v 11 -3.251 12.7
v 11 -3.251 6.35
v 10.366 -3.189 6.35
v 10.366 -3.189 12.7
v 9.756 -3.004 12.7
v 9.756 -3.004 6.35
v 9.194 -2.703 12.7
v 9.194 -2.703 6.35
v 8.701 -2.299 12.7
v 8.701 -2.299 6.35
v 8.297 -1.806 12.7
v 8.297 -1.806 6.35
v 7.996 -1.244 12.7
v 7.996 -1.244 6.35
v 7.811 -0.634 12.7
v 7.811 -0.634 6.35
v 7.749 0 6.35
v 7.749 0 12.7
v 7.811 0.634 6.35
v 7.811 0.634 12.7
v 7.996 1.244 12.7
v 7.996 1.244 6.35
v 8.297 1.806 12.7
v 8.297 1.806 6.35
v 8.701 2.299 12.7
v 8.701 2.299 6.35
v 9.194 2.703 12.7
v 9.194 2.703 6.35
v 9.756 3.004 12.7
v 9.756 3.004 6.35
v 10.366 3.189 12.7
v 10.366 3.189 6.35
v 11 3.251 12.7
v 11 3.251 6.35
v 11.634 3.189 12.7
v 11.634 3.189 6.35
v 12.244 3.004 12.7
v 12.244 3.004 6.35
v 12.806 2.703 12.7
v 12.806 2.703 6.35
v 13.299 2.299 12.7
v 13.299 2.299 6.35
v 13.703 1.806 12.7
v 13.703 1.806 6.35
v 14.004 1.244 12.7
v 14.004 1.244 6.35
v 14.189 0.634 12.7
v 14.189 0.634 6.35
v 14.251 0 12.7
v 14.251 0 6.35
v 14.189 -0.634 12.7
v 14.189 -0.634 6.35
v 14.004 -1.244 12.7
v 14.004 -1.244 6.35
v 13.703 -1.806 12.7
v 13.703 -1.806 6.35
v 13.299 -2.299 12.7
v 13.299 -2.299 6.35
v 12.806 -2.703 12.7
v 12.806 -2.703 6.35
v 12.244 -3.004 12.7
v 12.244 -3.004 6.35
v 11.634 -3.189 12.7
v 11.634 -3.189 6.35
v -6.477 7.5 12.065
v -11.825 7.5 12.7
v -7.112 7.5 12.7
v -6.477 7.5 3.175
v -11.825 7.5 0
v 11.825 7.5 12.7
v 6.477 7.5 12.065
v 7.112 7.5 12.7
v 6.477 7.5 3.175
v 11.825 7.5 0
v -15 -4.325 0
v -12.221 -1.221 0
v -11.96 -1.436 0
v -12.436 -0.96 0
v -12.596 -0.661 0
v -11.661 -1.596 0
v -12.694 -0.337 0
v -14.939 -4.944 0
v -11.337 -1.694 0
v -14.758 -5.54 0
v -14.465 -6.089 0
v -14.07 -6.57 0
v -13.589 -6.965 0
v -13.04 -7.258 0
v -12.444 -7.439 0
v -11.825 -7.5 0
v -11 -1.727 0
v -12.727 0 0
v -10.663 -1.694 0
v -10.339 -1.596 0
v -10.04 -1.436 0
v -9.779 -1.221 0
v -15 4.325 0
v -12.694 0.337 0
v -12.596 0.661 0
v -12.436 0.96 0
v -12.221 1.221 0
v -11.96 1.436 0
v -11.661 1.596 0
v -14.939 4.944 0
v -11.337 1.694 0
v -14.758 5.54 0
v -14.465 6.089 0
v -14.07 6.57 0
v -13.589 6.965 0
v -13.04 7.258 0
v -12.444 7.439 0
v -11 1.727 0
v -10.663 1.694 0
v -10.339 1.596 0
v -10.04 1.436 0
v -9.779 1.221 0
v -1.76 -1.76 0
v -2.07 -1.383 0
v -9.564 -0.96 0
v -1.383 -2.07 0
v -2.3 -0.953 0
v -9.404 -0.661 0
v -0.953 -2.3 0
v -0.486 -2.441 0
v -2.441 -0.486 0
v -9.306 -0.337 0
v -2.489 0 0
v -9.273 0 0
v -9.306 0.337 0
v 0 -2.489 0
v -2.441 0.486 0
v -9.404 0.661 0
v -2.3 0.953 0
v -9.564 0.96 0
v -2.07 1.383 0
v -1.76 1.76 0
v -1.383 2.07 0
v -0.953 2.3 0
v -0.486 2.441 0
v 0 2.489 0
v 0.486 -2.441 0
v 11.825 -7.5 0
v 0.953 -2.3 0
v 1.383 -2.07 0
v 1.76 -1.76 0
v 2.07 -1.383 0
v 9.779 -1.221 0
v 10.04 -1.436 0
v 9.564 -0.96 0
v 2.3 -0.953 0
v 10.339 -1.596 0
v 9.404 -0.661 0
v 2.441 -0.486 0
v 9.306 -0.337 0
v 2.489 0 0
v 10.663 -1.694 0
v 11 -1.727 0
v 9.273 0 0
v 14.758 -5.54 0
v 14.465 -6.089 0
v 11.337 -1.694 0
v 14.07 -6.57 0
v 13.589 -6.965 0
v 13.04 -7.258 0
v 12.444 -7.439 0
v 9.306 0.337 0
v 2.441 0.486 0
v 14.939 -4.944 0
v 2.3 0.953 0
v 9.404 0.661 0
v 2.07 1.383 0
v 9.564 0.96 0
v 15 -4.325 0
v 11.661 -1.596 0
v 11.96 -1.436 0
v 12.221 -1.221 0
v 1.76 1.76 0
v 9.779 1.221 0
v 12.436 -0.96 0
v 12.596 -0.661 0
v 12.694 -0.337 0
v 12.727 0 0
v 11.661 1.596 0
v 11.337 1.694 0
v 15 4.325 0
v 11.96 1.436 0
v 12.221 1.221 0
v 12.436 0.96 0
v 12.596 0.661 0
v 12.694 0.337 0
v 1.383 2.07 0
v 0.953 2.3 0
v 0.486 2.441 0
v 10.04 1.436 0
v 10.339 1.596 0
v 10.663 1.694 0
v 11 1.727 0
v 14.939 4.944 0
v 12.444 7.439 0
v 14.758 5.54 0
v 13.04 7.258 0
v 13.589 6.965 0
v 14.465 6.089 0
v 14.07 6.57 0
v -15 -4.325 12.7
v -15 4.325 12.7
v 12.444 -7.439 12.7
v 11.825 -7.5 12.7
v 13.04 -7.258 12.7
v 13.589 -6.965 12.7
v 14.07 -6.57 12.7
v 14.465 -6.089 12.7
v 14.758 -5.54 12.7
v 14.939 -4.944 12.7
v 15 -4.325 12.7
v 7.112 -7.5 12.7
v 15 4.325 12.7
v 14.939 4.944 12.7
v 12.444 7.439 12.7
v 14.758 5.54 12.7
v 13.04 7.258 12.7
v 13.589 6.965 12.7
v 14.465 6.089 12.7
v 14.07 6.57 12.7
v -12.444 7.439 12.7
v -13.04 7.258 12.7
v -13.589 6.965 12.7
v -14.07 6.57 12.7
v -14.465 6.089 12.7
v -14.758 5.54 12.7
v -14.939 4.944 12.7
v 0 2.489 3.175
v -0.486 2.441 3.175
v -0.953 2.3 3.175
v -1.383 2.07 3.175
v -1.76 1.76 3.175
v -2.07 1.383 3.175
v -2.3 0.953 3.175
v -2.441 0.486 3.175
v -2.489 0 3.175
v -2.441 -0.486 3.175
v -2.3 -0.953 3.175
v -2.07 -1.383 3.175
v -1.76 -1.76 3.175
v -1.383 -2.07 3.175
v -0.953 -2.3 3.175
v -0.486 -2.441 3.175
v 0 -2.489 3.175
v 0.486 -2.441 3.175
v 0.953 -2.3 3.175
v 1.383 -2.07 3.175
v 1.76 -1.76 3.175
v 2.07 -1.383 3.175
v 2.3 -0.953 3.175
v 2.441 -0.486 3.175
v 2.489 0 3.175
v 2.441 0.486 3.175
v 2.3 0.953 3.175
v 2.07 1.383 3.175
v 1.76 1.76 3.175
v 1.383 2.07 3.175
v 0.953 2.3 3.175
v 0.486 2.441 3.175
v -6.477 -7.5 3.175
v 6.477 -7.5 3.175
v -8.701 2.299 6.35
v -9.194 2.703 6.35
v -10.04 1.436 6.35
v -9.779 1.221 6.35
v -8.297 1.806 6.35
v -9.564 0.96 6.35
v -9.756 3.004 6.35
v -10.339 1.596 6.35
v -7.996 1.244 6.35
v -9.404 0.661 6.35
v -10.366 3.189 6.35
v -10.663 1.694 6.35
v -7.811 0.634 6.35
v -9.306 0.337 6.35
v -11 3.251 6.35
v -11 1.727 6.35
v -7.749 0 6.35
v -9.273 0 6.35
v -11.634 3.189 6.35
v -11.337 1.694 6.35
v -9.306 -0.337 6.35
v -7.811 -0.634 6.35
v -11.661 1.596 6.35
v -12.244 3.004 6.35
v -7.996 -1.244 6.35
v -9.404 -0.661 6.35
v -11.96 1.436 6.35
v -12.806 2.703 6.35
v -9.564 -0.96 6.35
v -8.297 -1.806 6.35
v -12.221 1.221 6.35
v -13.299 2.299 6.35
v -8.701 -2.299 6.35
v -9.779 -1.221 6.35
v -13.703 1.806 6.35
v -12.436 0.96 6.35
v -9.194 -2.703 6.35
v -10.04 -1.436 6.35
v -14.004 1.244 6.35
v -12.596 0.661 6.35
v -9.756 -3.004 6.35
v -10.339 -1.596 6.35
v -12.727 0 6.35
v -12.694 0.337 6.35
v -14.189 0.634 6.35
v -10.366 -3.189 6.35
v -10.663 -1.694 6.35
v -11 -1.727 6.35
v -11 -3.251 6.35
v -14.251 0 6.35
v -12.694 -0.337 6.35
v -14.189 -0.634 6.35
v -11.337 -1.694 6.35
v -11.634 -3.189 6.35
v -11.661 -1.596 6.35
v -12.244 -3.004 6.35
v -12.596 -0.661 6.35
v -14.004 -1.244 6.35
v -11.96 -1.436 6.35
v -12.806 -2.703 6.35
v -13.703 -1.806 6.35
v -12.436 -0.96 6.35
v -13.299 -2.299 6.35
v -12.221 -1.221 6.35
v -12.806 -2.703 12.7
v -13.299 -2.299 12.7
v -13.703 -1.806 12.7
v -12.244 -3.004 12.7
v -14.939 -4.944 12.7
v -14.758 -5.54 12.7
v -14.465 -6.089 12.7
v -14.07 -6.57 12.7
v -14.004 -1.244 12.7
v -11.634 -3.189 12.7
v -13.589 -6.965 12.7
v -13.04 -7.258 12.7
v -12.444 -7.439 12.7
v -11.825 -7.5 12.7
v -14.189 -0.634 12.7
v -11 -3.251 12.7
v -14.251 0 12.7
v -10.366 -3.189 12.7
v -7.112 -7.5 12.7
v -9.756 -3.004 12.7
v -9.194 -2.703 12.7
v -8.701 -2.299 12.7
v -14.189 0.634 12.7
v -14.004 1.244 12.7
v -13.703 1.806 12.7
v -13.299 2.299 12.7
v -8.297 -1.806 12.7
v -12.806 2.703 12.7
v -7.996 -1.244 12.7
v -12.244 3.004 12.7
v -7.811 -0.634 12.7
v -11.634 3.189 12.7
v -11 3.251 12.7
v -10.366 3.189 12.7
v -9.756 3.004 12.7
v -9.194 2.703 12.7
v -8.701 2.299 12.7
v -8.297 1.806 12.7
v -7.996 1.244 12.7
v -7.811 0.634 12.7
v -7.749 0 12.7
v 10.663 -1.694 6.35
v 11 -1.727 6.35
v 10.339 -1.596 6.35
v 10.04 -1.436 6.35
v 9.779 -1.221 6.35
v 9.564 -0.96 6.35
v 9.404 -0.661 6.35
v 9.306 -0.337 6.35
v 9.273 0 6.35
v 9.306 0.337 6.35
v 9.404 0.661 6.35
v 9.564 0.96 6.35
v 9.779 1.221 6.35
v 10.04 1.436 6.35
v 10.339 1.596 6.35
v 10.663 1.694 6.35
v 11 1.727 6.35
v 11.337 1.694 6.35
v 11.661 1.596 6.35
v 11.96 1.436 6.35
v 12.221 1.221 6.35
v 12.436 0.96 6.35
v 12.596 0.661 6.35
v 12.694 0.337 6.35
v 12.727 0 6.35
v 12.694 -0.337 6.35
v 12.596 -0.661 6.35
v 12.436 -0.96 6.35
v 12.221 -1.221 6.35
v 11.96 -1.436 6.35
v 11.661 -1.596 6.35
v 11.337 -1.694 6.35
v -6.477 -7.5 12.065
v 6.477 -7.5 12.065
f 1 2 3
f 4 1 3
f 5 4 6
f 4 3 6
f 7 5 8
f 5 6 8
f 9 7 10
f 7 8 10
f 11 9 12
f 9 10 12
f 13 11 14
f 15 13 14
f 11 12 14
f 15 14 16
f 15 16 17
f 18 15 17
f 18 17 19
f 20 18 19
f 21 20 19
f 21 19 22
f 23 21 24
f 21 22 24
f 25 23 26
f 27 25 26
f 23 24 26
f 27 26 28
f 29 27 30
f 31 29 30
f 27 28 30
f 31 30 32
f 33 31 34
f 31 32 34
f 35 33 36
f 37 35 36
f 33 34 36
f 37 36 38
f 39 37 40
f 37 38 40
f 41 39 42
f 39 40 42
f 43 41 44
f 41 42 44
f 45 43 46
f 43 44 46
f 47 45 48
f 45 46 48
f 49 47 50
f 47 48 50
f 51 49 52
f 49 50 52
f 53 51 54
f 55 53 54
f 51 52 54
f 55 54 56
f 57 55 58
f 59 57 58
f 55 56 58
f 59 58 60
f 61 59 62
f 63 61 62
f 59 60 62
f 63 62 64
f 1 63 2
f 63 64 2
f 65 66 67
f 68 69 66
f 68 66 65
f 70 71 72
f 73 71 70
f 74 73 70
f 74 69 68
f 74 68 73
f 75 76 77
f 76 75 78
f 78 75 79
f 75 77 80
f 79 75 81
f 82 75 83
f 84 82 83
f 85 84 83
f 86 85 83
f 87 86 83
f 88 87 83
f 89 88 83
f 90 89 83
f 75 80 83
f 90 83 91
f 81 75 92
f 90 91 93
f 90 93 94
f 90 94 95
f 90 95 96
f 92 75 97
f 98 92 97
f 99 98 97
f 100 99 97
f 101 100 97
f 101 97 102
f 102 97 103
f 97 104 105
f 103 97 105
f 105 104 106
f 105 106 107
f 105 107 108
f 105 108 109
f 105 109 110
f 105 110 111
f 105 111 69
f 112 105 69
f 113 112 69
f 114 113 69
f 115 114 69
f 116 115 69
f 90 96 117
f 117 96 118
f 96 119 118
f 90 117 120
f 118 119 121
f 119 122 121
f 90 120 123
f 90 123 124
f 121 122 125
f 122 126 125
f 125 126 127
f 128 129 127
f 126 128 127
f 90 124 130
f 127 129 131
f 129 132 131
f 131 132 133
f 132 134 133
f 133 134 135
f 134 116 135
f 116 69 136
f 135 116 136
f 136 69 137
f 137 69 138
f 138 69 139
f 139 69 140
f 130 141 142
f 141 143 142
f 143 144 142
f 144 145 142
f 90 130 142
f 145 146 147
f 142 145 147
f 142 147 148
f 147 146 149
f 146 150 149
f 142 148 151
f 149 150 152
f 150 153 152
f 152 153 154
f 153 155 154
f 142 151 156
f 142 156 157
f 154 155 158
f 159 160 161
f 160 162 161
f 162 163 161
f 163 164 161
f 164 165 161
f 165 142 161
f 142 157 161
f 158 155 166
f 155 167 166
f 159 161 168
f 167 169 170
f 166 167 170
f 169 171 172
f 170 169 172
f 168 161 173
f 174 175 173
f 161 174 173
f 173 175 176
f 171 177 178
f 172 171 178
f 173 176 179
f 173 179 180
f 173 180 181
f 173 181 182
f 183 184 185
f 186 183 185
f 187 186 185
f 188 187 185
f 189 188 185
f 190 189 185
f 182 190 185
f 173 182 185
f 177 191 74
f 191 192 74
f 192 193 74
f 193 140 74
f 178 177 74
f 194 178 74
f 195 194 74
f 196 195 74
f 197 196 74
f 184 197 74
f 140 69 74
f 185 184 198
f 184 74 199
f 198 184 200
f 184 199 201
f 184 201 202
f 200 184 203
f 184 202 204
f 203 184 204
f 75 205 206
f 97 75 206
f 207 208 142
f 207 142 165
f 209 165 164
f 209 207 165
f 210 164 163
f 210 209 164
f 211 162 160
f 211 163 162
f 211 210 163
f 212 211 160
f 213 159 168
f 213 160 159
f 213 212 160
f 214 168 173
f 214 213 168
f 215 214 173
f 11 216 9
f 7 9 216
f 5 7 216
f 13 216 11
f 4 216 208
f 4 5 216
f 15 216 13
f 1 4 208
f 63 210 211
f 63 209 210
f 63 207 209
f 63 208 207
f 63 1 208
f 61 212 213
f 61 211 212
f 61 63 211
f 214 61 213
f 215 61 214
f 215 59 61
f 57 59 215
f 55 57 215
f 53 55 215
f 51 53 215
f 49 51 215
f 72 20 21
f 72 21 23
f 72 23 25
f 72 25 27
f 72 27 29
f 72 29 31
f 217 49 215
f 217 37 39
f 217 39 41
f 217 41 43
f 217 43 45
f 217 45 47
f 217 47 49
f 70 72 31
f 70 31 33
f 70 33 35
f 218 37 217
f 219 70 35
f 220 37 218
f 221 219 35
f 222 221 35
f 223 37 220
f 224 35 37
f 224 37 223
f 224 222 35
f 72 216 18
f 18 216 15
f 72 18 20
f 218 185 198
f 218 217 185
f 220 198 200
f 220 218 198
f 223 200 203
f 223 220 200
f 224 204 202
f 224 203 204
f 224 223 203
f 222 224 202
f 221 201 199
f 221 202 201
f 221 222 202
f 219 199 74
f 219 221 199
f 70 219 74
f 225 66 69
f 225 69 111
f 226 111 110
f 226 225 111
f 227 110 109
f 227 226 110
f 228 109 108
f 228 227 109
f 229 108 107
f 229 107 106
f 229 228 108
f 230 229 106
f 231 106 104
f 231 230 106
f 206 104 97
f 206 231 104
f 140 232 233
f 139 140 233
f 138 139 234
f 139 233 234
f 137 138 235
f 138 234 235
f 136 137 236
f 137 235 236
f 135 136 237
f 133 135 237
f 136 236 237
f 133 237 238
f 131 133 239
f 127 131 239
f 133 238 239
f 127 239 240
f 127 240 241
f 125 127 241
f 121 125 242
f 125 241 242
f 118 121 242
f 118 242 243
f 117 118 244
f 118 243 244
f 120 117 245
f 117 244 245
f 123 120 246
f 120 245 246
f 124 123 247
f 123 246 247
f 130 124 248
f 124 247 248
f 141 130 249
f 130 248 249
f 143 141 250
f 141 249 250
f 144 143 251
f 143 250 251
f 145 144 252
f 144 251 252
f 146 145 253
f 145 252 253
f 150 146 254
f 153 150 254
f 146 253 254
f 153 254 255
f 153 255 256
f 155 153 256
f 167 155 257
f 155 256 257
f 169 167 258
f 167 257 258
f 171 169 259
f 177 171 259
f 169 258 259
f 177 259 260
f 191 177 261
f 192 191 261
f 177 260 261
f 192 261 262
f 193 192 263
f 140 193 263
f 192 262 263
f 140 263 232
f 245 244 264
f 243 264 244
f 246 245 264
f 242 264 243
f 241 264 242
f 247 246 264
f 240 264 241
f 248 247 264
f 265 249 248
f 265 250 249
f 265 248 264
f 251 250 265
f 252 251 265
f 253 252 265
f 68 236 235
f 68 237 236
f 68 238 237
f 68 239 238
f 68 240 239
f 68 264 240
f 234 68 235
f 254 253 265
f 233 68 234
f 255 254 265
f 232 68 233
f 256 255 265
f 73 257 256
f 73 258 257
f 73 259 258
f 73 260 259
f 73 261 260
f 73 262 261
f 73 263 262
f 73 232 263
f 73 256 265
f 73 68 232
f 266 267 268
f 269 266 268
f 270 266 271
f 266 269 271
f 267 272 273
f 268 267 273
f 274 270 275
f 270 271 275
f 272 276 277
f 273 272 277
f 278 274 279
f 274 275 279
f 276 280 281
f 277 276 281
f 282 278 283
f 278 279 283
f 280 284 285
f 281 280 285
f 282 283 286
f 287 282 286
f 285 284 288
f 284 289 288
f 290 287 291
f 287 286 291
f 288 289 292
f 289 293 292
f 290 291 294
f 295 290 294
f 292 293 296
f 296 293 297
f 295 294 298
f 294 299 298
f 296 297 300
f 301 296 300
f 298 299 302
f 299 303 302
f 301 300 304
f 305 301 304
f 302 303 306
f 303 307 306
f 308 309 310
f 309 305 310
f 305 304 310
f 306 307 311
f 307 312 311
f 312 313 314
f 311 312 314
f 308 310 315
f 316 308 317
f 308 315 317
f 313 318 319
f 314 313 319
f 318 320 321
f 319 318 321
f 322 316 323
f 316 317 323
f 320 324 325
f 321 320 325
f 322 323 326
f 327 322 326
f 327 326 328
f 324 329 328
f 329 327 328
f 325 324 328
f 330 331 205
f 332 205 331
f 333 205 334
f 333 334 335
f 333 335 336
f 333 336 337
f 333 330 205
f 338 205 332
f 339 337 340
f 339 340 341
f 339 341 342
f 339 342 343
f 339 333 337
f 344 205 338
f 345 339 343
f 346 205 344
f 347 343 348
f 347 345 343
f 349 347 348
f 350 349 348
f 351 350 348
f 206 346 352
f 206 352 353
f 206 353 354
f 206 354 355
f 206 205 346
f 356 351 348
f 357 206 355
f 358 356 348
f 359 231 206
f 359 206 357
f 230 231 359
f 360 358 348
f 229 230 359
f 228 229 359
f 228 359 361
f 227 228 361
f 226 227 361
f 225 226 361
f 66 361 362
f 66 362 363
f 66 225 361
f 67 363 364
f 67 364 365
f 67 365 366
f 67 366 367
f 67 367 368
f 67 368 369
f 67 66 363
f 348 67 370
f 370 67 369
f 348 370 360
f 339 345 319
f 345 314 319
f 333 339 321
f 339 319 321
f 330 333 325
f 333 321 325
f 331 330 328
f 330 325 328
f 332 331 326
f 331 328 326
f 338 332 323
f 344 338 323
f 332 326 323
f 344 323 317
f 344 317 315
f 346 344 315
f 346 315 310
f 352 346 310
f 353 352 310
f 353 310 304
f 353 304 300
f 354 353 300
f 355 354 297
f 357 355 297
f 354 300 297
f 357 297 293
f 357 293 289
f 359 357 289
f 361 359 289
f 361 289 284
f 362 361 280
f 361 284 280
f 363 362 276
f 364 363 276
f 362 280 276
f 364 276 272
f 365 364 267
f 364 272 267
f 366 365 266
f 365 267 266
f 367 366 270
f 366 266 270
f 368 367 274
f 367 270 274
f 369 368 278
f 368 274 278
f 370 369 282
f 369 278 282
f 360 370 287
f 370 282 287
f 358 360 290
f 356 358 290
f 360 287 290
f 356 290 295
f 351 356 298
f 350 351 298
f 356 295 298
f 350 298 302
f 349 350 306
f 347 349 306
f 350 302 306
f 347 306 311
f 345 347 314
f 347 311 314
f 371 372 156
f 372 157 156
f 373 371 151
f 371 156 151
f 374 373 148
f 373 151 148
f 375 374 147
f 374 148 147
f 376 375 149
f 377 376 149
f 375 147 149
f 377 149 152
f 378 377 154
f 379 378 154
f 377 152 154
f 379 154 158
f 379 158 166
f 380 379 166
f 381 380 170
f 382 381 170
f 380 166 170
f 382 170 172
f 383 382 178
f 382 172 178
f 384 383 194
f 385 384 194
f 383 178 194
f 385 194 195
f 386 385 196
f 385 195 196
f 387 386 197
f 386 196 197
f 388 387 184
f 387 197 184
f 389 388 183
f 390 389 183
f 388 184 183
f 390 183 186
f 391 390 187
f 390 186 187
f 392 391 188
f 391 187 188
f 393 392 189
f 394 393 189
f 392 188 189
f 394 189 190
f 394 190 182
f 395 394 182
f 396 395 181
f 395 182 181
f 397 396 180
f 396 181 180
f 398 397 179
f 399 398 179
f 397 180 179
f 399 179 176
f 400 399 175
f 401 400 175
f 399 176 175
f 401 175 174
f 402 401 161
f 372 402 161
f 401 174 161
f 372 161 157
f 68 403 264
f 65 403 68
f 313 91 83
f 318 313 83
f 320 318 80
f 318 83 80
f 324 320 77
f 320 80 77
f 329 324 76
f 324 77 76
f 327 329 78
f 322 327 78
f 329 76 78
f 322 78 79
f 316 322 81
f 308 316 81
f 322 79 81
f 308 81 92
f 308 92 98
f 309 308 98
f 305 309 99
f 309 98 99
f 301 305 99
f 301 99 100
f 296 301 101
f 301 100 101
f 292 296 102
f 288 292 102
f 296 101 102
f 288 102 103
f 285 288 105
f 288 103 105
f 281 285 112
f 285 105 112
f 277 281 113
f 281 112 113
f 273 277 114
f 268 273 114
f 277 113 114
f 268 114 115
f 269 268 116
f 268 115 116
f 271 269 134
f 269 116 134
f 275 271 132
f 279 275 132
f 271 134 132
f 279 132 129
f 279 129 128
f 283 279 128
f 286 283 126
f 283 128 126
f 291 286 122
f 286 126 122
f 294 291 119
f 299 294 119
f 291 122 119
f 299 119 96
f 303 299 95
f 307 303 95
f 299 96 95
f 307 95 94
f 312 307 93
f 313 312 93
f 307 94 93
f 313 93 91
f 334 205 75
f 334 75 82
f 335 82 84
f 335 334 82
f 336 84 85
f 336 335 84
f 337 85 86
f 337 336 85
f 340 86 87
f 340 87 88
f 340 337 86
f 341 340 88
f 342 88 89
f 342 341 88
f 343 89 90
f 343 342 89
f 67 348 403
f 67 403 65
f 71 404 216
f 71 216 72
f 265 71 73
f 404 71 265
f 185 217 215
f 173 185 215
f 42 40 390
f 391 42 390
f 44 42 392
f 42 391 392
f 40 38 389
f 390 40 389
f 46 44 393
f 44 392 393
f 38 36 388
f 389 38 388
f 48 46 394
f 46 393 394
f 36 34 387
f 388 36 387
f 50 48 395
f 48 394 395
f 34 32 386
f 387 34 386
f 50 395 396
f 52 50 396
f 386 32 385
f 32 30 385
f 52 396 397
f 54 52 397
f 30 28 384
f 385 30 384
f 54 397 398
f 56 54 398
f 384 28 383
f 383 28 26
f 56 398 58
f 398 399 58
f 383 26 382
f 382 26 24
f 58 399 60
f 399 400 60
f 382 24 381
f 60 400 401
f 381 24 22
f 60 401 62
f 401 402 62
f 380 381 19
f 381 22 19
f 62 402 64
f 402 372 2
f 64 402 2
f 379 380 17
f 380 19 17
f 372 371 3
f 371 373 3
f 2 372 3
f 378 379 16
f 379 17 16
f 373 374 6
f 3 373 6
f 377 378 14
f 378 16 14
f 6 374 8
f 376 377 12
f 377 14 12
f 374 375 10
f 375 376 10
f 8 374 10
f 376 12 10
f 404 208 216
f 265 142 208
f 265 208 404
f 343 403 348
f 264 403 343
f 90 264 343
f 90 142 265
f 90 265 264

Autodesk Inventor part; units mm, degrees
ref_plane "YZ Plane" through (0, 0, 0) normal (1, 0, 0) x (0, 1, 0)
ref_plane "XZ Plane" through (0, 0, 0) normal (0, 1, 0) x (-1, 0, 0)
ref_plane "XY Plane" through (0, 0, 0) normal (0, 0, 1) x (1, 0, 0)
sketch "Sketch1" plane through (0, 0, 0) normal (0, 0, 1) x (1, 0, 0)
  line L0 (-15, 7.5) -> (15, 7.5)
  line L1 (15, 7.5) -> (15, -7.5)
  line L2 (15, -7.5) -> (-15, -7.5)
  line L3 (-15, -7.5) -> (-15, 7.5)
  point P0 (0, 0)
  point P1 (-15, 0)
  point P2 (0, 7.5)
  dimension "d0" = 30
  dimension "d1" = 15
extrude "Extrusion1" add sketch "Sketch1" along normal blind 12.7
sketch "Sketch3" plane through (0, 0, 12.7) normal (0, 0, 1) x (1, 0, 0)
  line L0 (-15, 7.5) -> (15, 7.5) projected
  line L1 (15, -7.5) -> (-15, -7.5) projected
  line L2 (-6.477, 7.5) -> (6.477, 7.5)
  line L3 (6.477, 7.5) -> (6.477, -7.5)
  line L4 (6.477, -7.5) -> (-6.477, -7.5)
  line L5 (-6.477, -7.5) -> (-6.477, 7.5)
  point P0 (0, 0)
  point P1 (0, 7.5)
  dimension "d13" = 12.954
extrude "Extrusion2" cut sketch "Sketch3" against normal blind 9.525
sketch "Sketch4" plane through (0, 0, 0) normal (0, 0, -1) x (-1, 0, 0)
  point P0 (0, 0)
  point P1 (0, 0)
hole "Hole2" at (0, 0, 0) direction (0, 0, 1) diameter 4.9784 end through all thread size "1/4-20 UNC" class "2B" standard "ANSI Unified Screw Threads"
sketch "Sketch5" plane through (0, 0, 12.7) normal (0, 0, 1) x (1, 0, 0)
  point P0 (0, 0)
  point P1 (-11, 0)
  point P2 (11, 0)
  dimension "d23" = 11
  dimension "d24" = 11
hole "Hole3" at (-11, 0, 12.7) at (11, 0, 12.7) direction (0, 0, -1) diameter 3.4544 end through all counterbore diameter 6.5024 counterbore depth 6.35 clearance for "Socket Head Cap Screw" size "M3" standard "Ansi Metric M Profile"
chamfer "Chamfer1" distance 0.635 angle 45 2 edges at (6.477, 0, 12.7) (-6.477, 0, 12.7)
fillet "Fillet1" radius 3.175 4 edges at (15, 7.5, 6.35) (-15, 7.5, 6.35) (-15, -7.5, 6.35) (15, -7.5, 6.35)
properties part number "J002866" material "ALUMINUM, 6061-T651"
